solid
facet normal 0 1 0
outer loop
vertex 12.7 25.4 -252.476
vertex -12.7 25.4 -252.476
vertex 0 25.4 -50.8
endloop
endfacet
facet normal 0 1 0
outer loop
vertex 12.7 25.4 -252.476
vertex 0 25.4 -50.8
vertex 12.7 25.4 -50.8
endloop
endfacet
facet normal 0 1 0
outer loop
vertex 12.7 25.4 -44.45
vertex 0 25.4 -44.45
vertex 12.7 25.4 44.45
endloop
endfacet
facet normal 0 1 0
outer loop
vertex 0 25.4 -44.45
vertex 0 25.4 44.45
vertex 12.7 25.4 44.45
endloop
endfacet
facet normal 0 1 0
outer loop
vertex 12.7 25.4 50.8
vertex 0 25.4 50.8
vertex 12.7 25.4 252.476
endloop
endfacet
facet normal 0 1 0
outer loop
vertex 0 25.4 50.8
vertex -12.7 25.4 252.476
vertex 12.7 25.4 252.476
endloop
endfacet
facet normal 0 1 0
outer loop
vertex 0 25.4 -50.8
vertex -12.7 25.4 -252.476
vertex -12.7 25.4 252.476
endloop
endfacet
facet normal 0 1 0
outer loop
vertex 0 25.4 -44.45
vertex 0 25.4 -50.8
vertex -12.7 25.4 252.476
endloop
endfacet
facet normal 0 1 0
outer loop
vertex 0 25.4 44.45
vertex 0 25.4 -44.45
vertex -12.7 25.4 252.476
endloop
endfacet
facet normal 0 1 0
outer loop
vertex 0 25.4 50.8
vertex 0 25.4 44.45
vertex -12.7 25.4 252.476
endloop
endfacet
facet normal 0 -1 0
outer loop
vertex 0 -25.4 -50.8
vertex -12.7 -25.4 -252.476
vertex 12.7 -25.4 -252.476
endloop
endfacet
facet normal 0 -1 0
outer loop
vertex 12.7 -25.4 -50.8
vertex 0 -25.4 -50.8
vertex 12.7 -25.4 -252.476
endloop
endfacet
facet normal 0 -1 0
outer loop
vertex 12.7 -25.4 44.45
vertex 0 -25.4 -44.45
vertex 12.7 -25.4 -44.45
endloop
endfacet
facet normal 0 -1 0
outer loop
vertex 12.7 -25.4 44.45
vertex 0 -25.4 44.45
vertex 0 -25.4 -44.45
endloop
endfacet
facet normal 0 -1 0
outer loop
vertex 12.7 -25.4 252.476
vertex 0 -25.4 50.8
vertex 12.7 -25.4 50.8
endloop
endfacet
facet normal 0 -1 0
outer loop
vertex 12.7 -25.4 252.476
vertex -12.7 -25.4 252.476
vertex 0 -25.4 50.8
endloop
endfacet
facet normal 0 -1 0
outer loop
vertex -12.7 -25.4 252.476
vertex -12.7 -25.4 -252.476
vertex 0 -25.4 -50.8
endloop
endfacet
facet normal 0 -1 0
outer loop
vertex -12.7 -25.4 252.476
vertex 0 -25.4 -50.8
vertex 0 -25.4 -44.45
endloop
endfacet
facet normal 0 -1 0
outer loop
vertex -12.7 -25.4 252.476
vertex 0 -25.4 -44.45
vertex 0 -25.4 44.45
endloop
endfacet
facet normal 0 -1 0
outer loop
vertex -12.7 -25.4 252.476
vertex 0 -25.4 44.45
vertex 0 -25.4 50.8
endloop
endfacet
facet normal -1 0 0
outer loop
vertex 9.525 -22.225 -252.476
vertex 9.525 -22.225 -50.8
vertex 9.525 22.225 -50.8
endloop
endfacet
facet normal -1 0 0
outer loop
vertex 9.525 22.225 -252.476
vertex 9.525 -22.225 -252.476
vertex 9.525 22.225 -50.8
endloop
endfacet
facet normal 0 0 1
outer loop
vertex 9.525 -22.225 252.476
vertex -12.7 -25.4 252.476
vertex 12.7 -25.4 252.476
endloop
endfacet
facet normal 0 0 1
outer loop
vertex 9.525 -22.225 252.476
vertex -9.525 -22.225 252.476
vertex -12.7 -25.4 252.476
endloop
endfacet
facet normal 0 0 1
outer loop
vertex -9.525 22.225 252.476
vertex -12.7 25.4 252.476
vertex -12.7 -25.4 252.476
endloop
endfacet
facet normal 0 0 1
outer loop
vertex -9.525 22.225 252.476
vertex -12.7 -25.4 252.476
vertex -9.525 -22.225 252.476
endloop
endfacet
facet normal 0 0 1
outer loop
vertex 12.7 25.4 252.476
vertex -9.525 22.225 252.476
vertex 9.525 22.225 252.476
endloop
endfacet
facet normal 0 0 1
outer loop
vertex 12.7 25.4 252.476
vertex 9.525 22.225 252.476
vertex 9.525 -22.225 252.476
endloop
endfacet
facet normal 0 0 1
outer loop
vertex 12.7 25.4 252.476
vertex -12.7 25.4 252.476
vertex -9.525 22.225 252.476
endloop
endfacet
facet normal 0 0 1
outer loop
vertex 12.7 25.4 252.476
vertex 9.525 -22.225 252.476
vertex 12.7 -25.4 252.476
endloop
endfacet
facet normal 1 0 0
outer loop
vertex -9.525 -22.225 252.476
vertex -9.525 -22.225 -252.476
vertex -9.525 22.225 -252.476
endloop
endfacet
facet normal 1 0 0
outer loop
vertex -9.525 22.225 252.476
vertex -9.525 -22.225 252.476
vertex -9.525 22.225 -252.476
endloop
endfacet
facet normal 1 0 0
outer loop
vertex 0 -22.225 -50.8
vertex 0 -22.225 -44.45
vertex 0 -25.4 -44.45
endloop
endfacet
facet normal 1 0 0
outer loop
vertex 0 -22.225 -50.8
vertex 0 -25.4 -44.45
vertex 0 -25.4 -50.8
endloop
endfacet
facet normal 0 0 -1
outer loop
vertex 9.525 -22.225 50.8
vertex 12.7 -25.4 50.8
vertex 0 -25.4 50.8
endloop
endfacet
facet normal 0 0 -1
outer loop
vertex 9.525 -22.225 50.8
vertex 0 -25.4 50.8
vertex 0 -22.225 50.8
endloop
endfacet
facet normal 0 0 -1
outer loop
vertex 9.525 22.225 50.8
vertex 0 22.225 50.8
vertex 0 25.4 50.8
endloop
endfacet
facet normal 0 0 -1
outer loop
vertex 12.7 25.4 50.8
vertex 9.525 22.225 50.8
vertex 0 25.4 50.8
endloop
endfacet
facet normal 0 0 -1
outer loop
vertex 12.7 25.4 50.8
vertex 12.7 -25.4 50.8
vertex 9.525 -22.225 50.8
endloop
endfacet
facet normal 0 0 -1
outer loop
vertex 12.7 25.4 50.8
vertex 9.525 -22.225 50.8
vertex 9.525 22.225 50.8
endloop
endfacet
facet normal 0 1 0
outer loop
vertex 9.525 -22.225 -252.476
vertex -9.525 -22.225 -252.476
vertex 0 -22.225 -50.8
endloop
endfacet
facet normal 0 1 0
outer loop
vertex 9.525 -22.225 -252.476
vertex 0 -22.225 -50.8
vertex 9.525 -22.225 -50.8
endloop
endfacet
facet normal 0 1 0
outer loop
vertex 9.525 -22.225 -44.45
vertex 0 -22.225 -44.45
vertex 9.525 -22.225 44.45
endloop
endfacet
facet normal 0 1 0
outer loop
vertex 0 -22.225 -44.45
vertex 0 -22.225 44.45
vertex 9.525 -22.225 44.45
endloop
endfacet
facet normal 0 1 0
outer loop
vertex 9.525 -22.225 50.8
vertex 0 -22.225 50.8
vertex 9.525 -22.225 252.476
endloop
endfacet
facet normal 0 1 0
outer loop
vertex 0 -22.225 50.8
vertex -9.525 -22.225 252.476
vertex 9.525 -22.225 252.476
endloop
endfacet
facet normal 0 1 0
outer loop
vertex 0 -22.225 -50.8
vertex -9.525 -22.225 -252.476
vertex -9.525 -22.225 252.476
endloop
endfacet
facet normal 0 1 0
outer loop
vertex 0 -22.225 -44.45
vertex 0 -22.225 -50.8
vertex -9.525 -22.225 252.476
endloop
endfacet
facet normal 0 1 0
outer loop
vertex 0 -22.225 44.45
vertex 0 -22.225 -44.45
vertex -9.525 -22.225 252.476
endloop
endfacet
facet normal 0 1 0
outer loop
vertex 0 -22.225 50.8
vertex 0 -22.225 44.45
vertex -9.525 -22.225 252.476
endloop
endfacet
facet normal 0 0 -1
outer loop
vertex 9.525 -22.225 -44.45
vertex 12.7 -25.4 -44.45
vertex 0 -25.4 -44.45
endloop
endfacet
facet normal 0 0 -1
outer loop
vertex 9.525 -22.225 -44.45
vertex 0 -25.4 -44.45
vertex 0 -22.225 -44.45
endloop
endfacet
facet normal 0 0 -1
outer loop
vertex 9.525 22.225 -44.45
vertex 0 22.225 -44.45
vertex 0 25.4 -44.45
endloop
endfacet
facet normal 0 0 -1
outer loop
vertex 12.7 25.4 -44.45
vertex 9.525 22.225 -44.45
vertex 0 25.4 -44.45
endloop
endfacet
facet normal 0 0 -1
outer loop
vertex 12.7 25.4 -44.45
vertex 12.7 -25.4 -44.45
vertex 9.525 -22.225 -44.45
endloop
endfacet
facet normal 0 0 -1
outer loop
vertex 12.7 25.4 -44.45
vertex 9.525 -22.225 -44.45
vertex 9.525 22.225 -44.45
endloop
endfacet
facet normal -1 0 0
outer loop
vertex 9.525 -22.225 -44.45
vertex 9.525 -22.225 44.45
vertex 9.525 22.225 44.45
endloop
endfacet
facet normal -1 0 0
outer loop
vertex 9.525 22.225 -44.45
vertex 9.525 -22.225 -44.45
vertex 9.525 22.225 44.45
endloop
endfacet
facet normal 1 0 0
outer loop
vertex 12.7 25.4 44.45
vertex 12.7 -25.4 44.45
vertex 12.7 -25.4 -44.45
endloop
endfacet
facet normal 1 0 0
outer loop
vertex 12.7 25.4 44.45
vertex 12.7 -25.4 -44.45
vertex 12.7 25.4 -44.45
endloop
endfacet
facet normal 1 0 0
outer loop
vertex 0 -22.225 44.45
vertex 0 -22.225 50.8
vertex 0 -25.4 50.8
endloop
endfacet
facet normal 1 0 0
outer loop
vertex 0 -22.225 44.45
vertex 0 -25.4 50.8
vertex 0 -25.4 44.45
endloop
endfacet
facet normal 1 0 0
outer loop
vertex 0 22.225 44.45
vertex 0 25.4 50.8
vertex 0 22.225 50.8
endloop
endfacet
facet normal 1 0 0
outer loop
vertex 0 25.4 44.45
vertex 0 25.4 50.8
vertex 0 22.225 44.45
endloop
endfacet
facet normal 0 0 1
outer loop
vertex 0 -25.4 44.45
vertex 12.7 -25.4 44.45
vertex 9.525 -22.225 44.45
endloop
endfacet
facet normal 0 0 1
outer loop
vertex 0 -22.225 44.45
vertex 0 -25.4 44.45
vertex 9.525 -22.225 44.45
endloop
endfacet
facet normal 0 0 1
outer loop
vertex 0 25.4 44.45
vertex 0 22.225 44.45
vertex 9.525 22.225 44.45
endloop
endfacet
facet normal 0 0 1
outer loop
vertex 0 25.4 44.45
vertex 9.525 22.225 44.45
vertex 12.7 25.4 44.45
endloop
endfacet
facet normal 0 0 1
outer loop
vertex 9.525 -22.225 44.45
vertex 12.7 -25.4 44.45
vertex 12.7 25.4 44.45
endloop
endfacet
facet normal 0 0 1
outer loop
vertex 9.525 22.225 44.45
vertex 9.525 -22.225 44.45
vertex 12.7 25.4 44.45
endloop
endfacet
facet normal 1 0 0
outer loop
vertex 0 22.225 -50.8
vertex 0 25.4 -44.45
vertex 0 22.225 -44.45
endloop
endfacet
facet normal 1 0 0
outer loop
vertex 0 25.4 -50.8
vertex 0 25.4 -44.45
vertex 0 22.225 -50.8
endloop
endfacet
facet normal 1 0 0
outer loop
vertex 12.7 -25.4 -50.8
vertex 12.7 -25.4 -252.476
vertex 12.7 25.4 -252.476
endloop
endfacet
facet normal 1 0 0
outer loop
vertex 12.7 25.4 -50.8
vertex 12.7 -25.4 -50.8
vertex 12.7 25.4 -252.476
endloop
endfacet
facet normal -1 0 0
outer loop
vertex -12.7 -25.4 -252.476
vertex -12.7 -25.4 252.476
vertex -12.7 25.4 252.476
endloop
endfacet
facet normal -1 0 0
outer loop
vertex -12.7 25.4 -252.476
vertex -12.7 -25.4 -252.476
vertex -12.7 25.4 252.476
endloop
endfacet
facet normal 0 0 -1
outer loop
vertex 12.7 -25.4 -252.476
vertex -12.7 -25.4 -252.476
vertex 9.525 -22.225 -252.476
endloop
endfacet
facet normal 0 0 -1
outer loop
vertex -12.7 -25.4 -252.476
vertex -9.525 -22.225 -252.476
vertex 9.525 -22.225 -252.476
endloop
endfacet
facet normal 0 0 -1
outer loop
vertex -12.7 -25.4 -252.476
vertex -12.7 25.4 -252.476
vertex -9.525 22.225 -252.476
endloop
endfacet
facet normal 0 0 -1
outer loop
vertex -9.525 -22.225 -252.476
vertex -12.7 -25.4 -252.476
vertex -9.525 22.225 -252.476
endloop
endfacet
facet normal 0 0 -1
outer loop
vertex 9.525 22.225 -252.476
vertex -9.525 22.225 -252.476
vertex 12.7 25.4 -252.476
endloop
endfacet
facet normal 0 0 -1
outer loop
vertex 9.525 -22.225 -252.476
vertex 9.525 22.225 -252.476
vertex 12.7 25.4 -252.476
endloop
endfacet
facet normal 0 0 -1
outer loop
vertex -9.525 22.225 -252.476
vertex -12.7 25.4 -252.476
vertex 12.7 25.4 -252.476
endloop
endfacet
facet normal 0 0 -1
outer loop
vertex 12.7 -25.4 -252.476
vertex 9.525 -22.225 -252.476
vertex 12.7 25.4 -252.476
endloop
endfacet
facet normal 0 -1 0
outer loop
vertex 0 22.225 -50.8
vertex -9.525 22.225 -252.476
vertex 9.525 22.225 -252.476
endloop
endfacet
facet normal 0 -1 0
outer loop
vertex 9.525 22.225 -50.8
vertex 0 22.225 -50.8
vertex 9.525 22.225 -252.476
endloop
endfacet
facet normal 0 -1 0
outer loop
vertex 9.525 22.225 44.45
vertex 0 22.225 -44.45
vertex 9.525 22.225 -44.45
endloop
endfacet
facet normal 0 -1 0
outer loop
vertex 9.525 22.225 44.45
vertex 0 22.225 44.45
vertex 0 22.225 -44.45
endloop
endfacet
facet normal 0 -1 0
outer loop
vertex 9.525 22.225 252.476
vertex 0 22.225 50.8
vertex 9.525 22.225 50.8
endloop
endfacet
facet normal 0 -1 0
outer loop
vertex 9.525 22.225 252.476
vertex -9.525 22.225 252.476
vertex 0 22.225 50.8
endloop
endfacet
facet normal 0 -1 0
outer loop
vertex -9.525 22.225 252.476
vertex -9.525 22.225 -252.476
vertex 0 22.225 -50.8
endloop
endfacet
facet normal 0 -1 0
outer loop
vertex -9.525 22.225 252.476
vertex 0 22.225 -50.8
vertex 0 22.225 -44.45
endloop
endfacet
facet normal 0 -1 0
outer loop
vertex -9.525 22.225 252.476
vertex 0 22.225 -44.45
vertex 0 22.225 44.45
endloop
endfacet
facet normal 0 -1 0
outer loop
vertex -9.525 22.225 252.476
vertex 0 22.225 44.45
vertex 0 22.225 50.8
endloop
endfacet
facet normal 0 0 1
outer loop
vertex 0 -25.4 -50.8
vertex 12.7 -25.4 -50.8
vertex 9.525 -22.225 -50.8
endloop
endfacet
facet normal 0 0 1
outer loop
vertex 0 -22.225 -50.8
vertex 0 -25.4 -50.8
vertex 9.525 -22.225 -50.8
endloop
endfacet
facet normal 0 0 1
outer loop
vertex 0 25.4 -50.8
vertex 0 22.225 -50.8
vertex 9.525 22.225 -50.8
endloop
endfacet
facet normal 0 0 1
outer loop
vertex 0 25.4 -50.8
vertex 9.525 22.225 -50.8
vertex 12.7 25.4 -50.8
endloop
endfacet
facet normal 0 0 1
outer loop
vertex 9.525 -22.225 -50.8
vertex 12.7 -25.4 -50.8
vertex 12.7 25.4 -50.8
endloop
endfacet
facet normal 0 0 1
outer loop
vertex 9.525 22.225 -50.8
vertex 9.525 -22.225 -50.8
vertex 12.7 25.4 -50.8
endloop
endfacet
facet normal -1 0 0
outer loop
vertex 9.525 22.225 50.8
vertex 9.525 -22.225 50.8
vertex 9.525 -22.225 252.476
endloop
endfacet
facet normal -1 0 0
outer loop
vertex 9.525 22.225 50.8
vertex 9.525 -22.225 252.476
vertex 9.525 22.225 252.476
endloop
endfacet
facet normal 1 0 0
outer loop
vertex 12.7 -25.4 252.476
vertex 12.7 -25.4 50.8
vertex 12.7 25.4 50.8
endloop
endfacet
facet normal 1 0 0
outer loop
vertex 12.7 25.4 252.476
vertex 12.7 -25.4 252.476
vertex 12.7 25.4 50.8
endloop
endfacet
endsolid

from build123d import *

# Parameters (mm, degrees)
SKETCH1_W           = 25.4
SKETCH1_H           = 50.8
SKETCH1_W_2         = 19.05
SKETCH1_H_2         = 44.45
BOSS_EXTRUDE1_DEPTH = 252.476
SKETCH2_W           = 6.35
SKETCH2_H           = 50.8
CUT_EXTRUDE1_DEPTH  = 12.7


with BuildPart() as part:
    # Sketch1 → Boss-Extrude1 (new, symmetric)
    with BuildSketch(Plane.XY):
        Rectangle(SKETCH1_W, SKETCH1_H)
        Rectangle(SKETCH1_W_2, SKETCH1_H_2, mode=Mode.SUBTRACT)
    extrude(amount=BOSS_EXTRUDE1_DEPTH, both=True)

    # Sketch2 → Cut-Extrude1 (cut)
    with BuildSketch(Plane(origin=(12.7, 0, 0), x_dir=(0, 0, -1), z_dir=(1, 0, 0))):
        with Locations((47.625, 0)):
            Rectangle(SKETCH2_W, SKETCH2_H)
        with Locations((-47.625, 0)):
            Rectangle(SKETCH2_W, SKETCH2_H)
    extrude(amount=-CUT_EXTRUDE1_DEPTH, mode=Mode.SUBTRACT)


solid = part.part
